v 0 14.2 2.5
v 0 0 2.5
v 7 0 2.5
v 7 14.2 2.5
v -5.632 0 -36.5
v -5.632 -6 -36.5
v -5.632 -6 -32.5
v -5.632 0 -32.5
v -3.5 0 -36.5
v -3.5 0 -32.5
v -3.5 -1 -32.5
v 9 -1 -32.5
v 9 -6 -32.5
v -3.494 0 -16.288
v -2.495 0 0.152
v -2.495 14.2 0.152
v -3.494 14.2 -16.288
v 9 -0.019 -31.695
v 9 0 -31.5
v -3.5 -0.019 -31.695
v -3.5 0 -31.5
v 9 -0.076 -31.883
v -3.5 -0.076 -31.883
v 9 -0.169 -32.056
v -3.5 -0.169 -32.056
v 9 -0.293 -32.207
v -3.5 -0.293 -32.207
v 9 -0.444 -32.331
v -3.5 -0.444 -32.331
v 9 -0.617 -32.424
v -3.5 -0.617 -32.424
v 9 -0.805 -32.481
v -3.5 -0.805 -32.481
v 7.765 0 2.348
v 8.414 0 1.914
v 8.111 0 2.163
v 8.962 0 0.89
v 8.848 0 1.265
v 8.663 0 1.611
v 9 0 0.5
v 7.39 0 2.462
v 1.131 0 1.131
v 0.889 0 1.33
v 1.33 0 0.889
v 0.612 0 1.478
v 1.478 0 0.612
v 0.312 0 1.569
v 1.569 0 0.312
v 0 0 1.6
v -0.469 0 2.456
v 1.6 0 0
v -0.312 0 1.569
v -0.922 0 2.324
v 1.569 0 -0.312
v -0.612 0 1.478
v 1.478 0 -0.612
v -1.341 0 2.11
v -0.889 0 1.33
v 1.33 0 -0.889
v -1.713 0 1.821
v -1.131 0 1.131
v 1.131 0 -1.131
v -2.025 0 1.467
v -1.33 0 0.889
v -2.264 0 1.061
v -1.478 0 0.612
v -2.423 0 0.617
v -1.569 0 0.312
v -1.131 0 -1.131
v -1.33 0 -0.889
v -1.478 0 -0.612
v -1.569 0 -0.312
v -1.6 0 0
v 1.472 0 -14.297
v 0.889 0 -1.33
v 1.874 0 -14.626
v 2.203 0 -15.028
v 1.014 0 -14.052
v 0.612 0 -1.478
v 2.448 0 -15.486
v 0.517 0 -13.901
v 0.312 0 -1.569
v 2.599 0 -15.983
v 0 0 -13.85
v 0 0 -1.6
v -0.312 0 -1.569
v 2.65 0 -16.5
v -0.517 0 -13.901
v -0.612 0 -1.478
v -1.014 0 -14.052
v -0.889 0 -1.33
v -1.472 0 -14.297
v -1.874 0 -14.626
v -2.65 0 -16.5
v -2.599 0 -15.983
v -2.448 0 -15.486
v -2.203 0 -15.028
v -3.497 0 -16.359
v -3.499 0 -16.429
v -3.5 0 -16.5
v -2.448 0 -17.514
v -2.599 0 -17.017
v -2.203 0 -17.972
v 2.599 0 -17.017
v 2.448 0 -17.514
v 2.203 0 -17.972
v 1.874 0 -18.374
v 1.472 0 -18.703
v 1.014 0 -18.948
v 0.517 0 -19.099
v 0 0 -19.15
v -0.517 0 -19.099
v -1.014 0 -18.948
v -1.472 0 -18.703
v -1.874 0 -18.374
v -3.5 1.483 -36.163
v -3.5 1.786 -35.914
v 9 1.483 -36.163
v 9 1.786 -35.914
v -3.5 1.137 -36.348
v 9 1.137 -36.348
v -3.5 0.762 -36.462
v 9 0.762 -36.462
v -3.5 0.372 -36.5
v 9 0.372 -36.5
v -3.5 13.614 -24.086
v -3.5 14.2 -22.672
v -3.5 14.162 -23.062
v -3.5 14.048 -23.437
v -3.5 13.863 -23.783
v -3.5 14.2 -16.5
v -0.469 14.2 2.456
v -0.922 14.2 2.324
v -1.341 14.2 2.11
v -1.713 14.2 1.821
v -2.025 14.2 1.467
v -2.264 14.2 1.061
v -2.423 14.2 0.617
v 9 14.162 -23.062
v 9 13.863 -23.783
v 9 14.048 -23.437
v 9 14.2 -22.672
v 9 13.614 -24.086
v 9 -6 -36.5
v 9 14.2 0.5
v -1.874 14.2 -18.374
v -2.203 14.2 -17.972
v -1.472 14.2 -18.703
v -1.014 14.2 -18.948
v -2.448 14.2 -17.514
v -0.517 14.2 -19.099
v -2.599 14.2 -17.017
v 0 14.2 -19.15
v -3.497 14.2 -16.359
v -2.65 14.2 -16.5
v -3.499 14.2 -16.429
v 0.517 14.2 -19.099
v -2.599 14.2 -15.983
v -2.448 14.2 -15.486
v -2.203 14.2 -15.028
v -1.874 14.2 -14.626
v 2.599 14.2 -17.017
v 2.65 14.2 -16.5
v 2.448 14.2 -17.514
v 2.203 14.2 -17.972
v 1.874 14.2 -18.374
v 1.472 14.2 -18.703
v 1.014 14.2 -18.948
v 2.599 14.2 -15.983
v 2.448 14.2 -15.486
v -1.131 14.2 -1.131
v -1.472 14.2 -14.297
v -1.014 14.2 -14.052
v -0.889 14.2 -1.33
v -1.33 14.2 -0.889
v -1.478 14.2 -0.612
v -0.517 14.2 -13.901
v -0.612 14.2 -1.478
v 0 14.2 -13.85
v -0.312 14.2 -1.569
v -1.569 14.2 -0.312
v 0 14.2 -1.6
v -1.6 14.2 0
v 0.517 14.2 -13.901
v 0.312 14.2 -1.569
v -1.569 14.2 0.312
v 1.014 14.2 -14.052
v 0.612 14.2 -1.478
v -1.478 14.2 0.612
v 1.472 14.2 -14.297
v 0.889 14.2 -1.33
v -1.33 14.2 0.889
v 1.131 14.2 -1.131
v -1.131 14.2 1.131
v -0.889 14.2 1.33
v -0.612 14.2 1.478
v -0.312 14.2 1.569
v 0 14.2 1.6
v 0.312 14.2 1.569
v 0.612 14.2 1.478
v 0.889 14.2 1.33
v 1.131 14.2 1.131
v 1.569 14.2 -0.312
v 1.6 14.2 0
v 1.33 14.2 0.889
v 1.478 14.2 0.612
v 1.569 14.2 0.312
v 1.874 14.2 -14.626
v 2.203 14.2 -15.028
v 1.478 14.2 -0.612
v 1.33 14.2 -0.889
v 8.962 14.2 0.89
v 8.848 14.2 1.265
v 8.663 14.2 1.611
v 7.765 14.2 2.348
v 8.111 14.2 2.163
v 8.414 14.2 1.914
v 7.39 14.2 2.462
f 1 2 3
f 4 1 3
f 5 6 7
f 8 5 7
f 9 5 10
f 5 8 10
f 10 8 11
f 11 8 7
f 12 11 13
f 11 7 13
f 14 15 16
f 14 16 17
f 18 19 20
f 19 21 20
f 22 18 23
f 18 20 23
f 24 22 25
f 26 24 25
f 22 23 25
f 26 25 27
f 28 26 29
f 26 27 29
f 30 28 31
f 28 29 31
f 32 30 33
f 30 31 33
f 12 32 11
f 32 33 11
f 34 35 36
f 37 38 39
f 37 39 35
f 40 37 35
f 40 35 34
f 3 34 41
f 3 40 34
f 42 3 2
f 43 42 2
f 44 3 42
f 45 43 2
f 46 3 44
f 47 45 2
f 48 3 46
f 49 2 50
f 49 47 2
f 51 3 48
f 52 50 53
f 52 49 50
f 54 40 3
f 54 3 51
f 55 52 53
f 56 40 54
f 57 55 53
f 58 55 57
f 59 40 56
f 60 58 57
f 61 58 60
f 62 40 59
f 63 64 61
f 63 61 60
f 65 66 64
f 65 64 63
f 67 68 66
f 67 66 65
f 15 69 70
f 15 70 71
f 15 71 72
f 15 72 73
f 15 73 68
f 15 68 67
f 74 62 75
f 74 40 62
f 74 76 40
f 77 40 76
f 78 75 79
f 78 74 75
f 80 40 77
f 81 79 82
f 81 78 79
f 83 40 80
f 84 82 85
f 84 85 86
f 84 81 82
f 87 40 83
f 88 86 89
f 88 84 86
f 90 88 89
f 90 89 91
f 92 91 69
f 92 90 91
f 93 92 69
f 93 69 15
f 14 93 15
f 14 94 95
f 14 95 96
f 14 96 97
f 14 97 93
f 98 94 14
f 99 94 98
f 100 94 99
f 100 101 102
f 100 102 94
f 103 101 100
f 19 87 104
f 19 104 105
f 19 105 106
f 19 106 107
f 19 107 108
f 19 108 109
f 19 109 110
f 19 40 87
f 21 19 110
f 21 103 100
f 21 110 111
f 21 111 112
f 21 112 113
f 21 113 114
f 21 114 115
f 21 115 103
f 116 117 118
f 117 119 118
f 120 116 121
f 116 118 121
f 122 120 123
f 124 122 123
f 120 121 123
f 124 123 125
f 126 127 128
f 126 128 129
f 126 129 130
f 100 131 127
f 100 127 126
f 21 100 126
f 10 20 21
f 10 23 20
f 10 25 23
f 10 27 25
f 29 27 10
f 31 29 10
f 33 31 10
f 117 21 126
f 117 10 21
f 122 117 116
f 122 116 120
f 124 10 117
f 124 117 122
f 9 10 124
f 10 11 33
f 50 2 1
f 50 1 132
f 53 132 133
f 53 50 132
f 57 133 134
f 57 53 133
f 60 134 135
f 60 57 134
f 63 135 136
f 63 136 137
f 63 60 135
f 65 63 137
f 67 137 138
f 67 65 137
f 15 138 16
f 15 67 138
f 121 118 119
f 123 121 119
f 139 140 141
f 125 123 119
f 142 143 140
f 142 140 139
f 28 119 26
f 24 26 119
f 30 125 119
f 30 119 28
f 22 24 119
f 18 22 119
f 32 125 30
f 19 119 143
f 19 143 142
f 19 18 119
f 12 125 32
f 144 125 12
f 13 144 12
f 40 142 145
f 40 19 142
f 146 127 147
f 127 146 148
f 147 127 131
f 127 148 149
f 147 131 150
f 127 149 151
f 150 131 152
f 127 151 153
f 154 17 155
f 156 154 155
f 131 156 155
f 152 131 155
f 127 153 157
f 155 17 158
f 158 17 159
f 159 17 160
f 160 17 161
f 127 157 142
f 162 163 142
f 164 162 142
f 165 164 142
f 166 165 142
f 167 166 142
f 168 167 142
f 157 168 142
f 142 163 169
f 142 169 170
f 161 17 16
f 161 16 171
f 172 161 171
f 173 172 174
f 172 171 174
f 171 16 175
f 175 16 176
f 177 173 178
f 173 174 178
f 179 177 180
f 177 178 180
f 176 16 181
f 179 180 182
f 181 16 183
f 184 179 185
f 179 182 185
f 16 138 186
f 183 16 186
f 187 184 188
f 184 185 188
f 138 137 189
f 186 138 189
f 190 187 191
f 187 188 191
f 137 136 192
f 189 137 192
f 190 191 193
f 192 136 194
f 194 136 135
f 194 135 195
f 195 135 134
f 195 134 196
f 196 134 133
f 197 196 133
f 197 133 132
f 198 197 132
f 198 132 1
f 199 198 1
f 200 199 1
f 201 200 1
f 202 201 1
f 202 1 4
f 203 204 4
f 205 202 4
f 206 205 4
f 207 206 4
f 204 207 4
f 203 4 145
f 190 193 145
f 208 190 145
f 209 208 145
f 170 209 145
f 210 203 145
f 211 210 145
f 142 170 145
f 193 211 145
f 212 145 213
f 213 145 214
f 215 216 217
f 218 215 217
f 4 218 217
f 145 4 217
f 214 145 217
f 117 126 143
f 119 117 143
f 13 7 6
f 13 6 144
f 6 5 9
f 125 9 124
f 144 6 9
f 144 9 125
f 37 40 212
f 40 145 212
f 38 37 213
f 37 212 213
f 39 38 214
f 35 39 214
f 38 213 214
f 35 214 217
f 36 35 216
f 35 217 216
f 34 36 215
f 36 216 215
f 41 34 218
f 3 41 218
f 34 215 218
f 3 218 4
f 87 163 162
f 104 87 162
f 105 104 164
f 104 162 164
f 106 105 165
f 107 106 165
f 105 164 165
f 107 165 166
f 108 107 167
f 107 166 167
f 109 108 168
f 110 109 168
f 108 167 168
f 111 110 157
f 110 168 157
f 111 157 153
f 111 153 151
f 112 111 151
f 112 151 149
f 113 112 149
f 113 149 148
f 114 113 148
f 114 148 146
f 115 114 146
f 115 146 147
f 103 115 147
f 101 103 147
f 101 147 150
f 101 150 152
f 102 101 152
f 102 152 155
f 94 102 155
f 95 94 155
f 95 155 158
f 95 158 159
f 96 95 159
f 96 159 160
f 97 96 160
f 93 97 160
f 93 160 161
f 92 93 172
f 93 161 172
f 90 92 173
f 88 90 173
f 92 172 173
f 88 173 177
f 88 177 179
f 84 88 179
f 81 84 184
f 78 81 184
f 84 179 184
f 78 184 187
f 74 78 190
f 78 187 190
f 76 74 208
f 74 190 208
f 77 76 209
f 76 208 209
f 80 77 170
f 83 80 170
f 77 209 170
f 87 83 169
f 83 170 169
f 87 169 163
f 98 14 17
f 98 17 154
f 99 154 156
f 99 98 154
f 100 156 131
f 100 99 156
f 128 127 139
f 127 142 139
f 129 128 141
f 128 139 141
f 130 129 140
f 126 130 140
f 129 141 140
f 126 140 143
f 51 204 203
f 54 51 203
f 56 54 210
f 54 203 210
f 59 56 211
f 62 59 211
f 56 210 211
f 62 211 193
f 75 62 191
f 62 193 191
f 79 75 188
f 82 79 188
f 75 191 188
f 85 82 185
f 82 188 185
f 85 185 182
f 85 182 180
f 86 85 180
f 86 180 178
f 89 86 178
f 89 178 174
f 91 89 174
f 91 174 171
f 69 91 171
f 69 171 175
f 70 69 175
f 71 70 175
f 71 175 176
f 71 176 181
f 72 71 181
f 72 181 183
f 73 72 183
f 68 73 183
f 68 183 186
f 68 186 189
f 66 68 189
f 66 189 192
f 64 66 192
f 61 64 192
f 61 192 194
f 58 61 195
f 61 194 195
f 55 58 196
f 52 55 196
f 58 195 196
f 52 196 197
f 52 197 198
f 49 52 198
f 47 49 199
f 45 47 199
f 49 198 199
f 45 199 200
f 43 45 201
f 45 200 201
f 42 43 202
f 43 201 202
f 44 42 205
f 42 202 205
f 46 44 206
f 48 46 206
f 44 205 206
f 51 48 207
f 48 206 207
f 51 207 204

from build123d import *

# Parameters (mm, degrees)
SKETCH1_W                = 7
SKETCH1_H                = 16
SKETCH1_W_2              = 3.5
BOSS_EXTRUDE1_DEPTH      = 14.2
M3_CLEARANCE_HOLE1_D     = 3.2
M5_CLEARANCE_HOLE1_D     = 5.3
SKETCH6_W                = 14.632471907
SKETCH6_H                = 4
BOSS_EXTRUDE2_DEPTH      = 6
BOSS_EXTRUDE2_DEPTH_BACK = 14.2
FILLET1_R                = 1
FILLET2_R                = 2
SKETCH7_W                = 8.569742994
SKETCH7_H                = 13.514047563
CUT_EXTRUDE1_DEPTH       = 10
CHAMFER1_SIZE            = 13
FILLET4_R                = 2


with BuildPart() as part:
    # Sketch1 → Boss-Extrude1 (new body)
    with BuildSketch(Plane(origin=(0, 0, 0), x_dir=(1, 0, 0), z_dir=(0, 1, 0))):
        with BuildLine():
            Line((-3.5, 16.5), (3.5, 16.5))
            ThreePointArc((3.5, 16.5), (3.498391173, 16.393890619), (3.493566171, 16.287878788))
            Line((3.493566171, 16.287878788), (2.495404408, -0.151515152))
            ThreePointArc((2.495404408, -0.151515152), (0, -2.5), (-2.495404408, -0.151515152))
            Line((-2.495404408, -0.151515152), (-3.493566171, 16.287878788))
            ThreePointArc((-3.493566171, 16.287878788), (-3.498391173, 16.393890619), (-3.5, 16.5))
        make_face()
        with Locations((0, 24.5)):
            Rectangle(SKETCH1_W, SKETCH1_H)
        with BuildLine():
            ThreePointArc((2.495404408, -0.151515152), (1.713361042, -1.820547703), (0, -2.5))
            Line((0, -2.5), (9, -2.5))
            Line((9, -2.5), (9, 32.5))
            Line((9, 32.5), (3.5, 32.5))
            Line((3.5, 32.5), (3.5, 16.5))
            ThreePointArc((3.5, 16.5), (3.498391173, 16.393890619), (3.493566171, 16.287878788))
            Line((3.493566171, 16.287878788), (2.495404408, -0.151515152))
        make_face()
        with BuildLine():
            Line((0, 16.5), (0, -2.5))
            ThreePointArc((0, -2.5), (1.713361042, -1.820547703), (2.495404408, -0.151515152))
            Line((2.495404408, -0.151515152), (3.493566171, 16.287878788))
            ThreePointArc((3.493566171, 16.287878788), (3.498391173, 16.393890619), (3.5, 16.5))
            Line((3.5, 16.5), (0, 16.5))
        make_face()
        with Locations((1.75, 24.5)):
            Rectangle(SKETCH1_W_2, SKETCH1_H)
    extrude(amount=BOSS_EXTRUDE1_DEPTH)

    # M3 Clearance Hole1 (through all)
    with Locations(Plane(origin=(0, 0, 0), x_dir=(-1, 0, 0), z_dir=(0, -1, 0))):
        with Locations((0, 0)):
            Hole(M3_CLEARANCE_HOLE1_D / 2)

    # M5 Clearance Hole1 (through all)
    with Locations(Plane(origin=(0, 0, 0), x_dir=(-1, 0, 0), z_dir=(0, -1, 0))):
        with Locations((0, 16.5)):
            Hole(M5_CLEARANCE_HOLE1_D / 2)

    # Sketch6 → Boss-Extrude2 (add, two sides)
    with BuildSketch(Plane.XZ) as boss_extrude2_sk:
        with Locations((1.683764046, -34.5)):
            Rectangle(SKETCH6_W, SKETCH6_H)
    extrude(amount=BOSS_EXTRUDE2_DEPTH)
    extrude(boss_extrude2_sk.sketch, amount=-BOSS_EXTRUDE2_DEPTH_BACK)

    # Fillet1
    fillet1_edges = [part.edges().sort_by_distance(p)[0] for p in [
        (2.75, 0, -32.5),
    ]]
    fillet(fillet1_edges, radius=FILLET1_R)

    # Fillet2
    fillet2_edges = [part.edges().sort_by_distance(p)[0] for p in [
        (9, 7.1, 2.5),
    ]]
    fillet(fillet2_edges, radius=FILLET2_R)

    # Sketch7 → Cut-Extrude1 (cut)
    with BuildSketch(Plane.XZ):
        with Locations((-7.784871497, -36.46322787)):
            Rectangle(SKETCH7_W, SKETCH7_H)
    extrude(amount=-CUT_EXTRUDE1_DEPTH, mode=Mode.SUBTRACT)

    # Chamfer1
    chamfer1_edges = [part.edges().sort_by_distance(p)[0] for p in [
        (1.683764046, 14.2, -36.5),
    ]]
    chamfer(chamfer1_edges, length=CHAMFER1_SIZE)

    # Fillet4
    fillet4_edges = [part.edges().sort_by_distance(p)[0] for p in [
        (2.75, 1.2, -36.5),
        (2.75, 14.2, -23.5),
    ]]
    fillet(fillet4_edges, radius=FILLET4_R)


solid = part.part
